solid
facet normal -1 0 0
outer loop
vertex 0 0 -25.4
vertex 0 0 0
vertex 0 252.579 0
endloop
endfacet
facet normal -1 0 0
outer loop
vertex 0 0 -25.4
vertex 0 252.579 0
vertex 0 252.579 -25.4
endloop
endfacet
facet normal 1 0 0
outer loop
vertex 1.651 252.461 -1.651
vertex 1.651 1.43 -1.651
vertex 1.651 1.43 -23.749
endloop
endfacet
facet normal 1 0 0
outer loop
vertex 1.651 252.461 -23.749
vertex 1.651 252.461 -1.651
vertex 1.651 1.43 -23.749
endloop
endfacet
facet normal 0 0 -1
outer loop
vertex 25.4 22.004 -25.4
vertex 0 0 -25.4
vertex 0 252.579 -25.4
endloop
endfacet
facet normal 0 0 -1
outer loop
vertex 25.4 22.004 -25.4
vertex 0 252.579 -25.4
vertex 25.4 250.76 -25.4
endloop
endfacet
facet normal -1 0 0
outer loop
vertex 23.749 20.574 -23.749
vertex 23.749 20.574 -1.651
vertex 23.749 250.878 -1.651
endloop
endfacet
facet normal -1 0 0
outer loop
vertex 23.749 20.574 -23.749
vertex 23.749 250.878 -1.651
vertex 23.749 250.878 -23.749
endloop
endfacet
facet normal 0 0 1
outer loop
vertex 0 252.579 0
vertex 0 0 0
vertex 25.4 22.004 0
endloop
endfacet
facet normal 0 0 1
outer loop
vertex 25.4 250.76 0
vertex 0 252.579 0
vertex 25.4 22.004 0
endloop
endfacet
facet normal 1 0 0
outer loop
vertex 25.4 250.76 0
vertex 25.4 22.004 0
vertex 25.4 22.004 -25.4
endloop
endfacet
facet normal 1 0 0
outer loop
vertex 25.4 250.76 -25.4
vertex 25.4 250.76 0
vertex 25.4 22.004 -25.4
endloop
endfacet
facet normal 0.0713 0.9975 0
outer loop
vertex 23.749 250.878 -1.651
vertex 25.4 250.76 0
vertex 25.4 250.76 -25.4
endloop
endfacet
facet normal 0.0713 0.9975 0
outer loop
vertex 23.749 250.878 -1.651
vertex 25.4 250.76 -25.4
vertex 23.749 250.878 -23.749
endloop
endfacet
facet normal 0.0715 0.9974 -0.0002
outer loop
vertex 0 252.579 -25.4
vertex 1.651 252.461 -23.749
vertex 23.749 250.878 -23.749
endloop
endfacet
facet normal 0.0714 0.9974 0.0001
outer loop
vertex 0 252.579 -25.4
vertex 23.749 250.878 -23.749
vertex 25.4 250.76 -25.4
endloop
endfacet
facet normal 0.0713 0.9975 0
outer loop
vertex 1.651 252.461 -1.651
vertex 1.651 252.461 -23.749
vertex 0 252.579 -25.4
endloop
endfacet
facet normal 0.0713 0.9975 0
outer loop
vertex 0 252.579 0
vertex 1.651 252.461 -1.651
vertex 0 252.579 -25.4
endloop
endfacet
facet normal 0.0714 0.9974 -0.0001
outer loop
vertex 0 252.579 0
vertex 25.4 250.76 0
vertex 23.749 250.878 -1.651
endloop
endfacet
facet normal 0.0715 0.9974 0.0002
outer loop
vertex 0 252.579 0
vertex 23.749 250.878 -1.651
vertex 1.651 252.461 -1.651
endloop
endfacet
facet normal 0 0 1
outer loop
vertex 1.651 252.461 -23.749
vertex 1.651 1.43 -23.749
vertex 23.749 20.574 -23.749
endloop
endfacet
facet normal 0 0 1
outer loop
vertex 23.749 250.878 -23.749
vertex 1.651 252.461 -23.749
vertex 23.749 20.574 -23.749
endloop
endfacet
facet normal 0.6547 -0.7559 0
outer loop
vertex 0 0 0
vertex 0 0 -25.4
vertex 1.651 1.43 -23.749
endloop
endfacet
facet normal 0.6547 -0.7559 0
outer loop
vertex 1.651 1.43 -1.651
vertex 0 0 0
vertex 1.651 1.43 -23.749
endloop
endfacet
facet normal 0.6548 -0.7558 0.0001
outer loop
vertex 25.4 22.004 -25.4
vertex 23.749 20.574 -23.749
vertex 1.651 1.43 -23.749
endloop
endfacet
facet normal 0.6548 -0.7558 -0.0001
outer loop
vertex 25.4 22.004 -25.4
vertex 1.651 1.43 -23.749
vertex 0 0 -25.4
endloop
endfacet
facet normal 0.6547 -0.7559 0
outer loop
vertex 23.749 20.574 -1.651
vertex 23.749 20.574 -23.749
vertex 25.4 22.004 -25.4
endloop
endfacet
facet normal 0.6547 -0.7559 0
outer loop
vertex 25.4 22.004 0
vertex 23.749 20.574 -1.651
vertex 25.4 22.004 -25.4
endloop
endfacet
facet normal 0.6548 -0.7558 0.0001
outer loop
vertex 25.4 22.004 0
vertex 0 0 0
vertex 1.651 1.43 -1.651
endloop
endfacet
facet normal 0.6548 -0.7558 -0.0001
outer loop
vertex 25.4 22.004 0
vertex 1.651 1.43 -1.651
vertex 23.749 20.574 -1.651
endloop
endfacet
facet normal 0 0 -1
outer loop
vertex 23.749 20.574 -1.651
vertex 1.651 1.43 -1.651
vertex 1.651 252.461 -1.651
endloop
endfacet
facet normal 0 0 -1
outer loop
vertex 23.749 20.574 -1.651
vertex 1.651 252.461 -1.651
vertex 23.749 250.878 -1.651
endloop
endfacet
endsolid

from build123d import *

# Parameters (mm, degrees)
SKETCH4_W           = 25.4
SKETCH4_H           = 25.4
BOSS_EXTRUDE1_DEPTH = 252.579
CUT_EXTRUDE1_DEPTH  = 256.120503372
CUT_EXTRUDE2_DEPTH  = 256.120503372
SHELL1_T            = -1.651


with BuildPart() as part:
    # Sketch4 → Boss-Extrude1 (new body)
    with BuildSketch(Plane(origin=(0, 0, 0), x_dir=(1, 0, 0), z_dir=(0, 1, 0))):
        with Locations((12.7, 12.7)):
            Rectangle(SKETCH4_W, SKETCH4_H)
    extrude(amount=BOSS_EXTRUDE1_DEPTH)

    # Sketch5 → Cut-Extrude1 (cut, through all)
    with BuildSketch(Plane.XY):
        Polygon((0, 252.579), (25.4, 252.579), (25.4, 250.759583461), align=None)
    extrude(amount=-CUT_EXTRUDE1_DEPTH, mode=Mode.SUBTRACT)

    # Sketch6 → Cut-Extrude2 (cut, through all)
    with BuildSketch(Plane.XY):
        Polygon((0, 0), (25.4, 22.004395982), (25.4, 0), align=None)
    extrude(amount=-CUT_EXTRUDE2_DEPTH, mode=Mode.SUBTRACT)

    # Shell1
    shell1_openings = [part.faces().sort_by_distance(p)[0] for p in [
        (12.7, 251.669291731, -12.7),
        (12.7, 11.002197991, -12.7),
    ]]
    offset(amount=SHELL1_T, openings=shell1_openings, kind=Kind.INTERSECTION)


solid = part.part
